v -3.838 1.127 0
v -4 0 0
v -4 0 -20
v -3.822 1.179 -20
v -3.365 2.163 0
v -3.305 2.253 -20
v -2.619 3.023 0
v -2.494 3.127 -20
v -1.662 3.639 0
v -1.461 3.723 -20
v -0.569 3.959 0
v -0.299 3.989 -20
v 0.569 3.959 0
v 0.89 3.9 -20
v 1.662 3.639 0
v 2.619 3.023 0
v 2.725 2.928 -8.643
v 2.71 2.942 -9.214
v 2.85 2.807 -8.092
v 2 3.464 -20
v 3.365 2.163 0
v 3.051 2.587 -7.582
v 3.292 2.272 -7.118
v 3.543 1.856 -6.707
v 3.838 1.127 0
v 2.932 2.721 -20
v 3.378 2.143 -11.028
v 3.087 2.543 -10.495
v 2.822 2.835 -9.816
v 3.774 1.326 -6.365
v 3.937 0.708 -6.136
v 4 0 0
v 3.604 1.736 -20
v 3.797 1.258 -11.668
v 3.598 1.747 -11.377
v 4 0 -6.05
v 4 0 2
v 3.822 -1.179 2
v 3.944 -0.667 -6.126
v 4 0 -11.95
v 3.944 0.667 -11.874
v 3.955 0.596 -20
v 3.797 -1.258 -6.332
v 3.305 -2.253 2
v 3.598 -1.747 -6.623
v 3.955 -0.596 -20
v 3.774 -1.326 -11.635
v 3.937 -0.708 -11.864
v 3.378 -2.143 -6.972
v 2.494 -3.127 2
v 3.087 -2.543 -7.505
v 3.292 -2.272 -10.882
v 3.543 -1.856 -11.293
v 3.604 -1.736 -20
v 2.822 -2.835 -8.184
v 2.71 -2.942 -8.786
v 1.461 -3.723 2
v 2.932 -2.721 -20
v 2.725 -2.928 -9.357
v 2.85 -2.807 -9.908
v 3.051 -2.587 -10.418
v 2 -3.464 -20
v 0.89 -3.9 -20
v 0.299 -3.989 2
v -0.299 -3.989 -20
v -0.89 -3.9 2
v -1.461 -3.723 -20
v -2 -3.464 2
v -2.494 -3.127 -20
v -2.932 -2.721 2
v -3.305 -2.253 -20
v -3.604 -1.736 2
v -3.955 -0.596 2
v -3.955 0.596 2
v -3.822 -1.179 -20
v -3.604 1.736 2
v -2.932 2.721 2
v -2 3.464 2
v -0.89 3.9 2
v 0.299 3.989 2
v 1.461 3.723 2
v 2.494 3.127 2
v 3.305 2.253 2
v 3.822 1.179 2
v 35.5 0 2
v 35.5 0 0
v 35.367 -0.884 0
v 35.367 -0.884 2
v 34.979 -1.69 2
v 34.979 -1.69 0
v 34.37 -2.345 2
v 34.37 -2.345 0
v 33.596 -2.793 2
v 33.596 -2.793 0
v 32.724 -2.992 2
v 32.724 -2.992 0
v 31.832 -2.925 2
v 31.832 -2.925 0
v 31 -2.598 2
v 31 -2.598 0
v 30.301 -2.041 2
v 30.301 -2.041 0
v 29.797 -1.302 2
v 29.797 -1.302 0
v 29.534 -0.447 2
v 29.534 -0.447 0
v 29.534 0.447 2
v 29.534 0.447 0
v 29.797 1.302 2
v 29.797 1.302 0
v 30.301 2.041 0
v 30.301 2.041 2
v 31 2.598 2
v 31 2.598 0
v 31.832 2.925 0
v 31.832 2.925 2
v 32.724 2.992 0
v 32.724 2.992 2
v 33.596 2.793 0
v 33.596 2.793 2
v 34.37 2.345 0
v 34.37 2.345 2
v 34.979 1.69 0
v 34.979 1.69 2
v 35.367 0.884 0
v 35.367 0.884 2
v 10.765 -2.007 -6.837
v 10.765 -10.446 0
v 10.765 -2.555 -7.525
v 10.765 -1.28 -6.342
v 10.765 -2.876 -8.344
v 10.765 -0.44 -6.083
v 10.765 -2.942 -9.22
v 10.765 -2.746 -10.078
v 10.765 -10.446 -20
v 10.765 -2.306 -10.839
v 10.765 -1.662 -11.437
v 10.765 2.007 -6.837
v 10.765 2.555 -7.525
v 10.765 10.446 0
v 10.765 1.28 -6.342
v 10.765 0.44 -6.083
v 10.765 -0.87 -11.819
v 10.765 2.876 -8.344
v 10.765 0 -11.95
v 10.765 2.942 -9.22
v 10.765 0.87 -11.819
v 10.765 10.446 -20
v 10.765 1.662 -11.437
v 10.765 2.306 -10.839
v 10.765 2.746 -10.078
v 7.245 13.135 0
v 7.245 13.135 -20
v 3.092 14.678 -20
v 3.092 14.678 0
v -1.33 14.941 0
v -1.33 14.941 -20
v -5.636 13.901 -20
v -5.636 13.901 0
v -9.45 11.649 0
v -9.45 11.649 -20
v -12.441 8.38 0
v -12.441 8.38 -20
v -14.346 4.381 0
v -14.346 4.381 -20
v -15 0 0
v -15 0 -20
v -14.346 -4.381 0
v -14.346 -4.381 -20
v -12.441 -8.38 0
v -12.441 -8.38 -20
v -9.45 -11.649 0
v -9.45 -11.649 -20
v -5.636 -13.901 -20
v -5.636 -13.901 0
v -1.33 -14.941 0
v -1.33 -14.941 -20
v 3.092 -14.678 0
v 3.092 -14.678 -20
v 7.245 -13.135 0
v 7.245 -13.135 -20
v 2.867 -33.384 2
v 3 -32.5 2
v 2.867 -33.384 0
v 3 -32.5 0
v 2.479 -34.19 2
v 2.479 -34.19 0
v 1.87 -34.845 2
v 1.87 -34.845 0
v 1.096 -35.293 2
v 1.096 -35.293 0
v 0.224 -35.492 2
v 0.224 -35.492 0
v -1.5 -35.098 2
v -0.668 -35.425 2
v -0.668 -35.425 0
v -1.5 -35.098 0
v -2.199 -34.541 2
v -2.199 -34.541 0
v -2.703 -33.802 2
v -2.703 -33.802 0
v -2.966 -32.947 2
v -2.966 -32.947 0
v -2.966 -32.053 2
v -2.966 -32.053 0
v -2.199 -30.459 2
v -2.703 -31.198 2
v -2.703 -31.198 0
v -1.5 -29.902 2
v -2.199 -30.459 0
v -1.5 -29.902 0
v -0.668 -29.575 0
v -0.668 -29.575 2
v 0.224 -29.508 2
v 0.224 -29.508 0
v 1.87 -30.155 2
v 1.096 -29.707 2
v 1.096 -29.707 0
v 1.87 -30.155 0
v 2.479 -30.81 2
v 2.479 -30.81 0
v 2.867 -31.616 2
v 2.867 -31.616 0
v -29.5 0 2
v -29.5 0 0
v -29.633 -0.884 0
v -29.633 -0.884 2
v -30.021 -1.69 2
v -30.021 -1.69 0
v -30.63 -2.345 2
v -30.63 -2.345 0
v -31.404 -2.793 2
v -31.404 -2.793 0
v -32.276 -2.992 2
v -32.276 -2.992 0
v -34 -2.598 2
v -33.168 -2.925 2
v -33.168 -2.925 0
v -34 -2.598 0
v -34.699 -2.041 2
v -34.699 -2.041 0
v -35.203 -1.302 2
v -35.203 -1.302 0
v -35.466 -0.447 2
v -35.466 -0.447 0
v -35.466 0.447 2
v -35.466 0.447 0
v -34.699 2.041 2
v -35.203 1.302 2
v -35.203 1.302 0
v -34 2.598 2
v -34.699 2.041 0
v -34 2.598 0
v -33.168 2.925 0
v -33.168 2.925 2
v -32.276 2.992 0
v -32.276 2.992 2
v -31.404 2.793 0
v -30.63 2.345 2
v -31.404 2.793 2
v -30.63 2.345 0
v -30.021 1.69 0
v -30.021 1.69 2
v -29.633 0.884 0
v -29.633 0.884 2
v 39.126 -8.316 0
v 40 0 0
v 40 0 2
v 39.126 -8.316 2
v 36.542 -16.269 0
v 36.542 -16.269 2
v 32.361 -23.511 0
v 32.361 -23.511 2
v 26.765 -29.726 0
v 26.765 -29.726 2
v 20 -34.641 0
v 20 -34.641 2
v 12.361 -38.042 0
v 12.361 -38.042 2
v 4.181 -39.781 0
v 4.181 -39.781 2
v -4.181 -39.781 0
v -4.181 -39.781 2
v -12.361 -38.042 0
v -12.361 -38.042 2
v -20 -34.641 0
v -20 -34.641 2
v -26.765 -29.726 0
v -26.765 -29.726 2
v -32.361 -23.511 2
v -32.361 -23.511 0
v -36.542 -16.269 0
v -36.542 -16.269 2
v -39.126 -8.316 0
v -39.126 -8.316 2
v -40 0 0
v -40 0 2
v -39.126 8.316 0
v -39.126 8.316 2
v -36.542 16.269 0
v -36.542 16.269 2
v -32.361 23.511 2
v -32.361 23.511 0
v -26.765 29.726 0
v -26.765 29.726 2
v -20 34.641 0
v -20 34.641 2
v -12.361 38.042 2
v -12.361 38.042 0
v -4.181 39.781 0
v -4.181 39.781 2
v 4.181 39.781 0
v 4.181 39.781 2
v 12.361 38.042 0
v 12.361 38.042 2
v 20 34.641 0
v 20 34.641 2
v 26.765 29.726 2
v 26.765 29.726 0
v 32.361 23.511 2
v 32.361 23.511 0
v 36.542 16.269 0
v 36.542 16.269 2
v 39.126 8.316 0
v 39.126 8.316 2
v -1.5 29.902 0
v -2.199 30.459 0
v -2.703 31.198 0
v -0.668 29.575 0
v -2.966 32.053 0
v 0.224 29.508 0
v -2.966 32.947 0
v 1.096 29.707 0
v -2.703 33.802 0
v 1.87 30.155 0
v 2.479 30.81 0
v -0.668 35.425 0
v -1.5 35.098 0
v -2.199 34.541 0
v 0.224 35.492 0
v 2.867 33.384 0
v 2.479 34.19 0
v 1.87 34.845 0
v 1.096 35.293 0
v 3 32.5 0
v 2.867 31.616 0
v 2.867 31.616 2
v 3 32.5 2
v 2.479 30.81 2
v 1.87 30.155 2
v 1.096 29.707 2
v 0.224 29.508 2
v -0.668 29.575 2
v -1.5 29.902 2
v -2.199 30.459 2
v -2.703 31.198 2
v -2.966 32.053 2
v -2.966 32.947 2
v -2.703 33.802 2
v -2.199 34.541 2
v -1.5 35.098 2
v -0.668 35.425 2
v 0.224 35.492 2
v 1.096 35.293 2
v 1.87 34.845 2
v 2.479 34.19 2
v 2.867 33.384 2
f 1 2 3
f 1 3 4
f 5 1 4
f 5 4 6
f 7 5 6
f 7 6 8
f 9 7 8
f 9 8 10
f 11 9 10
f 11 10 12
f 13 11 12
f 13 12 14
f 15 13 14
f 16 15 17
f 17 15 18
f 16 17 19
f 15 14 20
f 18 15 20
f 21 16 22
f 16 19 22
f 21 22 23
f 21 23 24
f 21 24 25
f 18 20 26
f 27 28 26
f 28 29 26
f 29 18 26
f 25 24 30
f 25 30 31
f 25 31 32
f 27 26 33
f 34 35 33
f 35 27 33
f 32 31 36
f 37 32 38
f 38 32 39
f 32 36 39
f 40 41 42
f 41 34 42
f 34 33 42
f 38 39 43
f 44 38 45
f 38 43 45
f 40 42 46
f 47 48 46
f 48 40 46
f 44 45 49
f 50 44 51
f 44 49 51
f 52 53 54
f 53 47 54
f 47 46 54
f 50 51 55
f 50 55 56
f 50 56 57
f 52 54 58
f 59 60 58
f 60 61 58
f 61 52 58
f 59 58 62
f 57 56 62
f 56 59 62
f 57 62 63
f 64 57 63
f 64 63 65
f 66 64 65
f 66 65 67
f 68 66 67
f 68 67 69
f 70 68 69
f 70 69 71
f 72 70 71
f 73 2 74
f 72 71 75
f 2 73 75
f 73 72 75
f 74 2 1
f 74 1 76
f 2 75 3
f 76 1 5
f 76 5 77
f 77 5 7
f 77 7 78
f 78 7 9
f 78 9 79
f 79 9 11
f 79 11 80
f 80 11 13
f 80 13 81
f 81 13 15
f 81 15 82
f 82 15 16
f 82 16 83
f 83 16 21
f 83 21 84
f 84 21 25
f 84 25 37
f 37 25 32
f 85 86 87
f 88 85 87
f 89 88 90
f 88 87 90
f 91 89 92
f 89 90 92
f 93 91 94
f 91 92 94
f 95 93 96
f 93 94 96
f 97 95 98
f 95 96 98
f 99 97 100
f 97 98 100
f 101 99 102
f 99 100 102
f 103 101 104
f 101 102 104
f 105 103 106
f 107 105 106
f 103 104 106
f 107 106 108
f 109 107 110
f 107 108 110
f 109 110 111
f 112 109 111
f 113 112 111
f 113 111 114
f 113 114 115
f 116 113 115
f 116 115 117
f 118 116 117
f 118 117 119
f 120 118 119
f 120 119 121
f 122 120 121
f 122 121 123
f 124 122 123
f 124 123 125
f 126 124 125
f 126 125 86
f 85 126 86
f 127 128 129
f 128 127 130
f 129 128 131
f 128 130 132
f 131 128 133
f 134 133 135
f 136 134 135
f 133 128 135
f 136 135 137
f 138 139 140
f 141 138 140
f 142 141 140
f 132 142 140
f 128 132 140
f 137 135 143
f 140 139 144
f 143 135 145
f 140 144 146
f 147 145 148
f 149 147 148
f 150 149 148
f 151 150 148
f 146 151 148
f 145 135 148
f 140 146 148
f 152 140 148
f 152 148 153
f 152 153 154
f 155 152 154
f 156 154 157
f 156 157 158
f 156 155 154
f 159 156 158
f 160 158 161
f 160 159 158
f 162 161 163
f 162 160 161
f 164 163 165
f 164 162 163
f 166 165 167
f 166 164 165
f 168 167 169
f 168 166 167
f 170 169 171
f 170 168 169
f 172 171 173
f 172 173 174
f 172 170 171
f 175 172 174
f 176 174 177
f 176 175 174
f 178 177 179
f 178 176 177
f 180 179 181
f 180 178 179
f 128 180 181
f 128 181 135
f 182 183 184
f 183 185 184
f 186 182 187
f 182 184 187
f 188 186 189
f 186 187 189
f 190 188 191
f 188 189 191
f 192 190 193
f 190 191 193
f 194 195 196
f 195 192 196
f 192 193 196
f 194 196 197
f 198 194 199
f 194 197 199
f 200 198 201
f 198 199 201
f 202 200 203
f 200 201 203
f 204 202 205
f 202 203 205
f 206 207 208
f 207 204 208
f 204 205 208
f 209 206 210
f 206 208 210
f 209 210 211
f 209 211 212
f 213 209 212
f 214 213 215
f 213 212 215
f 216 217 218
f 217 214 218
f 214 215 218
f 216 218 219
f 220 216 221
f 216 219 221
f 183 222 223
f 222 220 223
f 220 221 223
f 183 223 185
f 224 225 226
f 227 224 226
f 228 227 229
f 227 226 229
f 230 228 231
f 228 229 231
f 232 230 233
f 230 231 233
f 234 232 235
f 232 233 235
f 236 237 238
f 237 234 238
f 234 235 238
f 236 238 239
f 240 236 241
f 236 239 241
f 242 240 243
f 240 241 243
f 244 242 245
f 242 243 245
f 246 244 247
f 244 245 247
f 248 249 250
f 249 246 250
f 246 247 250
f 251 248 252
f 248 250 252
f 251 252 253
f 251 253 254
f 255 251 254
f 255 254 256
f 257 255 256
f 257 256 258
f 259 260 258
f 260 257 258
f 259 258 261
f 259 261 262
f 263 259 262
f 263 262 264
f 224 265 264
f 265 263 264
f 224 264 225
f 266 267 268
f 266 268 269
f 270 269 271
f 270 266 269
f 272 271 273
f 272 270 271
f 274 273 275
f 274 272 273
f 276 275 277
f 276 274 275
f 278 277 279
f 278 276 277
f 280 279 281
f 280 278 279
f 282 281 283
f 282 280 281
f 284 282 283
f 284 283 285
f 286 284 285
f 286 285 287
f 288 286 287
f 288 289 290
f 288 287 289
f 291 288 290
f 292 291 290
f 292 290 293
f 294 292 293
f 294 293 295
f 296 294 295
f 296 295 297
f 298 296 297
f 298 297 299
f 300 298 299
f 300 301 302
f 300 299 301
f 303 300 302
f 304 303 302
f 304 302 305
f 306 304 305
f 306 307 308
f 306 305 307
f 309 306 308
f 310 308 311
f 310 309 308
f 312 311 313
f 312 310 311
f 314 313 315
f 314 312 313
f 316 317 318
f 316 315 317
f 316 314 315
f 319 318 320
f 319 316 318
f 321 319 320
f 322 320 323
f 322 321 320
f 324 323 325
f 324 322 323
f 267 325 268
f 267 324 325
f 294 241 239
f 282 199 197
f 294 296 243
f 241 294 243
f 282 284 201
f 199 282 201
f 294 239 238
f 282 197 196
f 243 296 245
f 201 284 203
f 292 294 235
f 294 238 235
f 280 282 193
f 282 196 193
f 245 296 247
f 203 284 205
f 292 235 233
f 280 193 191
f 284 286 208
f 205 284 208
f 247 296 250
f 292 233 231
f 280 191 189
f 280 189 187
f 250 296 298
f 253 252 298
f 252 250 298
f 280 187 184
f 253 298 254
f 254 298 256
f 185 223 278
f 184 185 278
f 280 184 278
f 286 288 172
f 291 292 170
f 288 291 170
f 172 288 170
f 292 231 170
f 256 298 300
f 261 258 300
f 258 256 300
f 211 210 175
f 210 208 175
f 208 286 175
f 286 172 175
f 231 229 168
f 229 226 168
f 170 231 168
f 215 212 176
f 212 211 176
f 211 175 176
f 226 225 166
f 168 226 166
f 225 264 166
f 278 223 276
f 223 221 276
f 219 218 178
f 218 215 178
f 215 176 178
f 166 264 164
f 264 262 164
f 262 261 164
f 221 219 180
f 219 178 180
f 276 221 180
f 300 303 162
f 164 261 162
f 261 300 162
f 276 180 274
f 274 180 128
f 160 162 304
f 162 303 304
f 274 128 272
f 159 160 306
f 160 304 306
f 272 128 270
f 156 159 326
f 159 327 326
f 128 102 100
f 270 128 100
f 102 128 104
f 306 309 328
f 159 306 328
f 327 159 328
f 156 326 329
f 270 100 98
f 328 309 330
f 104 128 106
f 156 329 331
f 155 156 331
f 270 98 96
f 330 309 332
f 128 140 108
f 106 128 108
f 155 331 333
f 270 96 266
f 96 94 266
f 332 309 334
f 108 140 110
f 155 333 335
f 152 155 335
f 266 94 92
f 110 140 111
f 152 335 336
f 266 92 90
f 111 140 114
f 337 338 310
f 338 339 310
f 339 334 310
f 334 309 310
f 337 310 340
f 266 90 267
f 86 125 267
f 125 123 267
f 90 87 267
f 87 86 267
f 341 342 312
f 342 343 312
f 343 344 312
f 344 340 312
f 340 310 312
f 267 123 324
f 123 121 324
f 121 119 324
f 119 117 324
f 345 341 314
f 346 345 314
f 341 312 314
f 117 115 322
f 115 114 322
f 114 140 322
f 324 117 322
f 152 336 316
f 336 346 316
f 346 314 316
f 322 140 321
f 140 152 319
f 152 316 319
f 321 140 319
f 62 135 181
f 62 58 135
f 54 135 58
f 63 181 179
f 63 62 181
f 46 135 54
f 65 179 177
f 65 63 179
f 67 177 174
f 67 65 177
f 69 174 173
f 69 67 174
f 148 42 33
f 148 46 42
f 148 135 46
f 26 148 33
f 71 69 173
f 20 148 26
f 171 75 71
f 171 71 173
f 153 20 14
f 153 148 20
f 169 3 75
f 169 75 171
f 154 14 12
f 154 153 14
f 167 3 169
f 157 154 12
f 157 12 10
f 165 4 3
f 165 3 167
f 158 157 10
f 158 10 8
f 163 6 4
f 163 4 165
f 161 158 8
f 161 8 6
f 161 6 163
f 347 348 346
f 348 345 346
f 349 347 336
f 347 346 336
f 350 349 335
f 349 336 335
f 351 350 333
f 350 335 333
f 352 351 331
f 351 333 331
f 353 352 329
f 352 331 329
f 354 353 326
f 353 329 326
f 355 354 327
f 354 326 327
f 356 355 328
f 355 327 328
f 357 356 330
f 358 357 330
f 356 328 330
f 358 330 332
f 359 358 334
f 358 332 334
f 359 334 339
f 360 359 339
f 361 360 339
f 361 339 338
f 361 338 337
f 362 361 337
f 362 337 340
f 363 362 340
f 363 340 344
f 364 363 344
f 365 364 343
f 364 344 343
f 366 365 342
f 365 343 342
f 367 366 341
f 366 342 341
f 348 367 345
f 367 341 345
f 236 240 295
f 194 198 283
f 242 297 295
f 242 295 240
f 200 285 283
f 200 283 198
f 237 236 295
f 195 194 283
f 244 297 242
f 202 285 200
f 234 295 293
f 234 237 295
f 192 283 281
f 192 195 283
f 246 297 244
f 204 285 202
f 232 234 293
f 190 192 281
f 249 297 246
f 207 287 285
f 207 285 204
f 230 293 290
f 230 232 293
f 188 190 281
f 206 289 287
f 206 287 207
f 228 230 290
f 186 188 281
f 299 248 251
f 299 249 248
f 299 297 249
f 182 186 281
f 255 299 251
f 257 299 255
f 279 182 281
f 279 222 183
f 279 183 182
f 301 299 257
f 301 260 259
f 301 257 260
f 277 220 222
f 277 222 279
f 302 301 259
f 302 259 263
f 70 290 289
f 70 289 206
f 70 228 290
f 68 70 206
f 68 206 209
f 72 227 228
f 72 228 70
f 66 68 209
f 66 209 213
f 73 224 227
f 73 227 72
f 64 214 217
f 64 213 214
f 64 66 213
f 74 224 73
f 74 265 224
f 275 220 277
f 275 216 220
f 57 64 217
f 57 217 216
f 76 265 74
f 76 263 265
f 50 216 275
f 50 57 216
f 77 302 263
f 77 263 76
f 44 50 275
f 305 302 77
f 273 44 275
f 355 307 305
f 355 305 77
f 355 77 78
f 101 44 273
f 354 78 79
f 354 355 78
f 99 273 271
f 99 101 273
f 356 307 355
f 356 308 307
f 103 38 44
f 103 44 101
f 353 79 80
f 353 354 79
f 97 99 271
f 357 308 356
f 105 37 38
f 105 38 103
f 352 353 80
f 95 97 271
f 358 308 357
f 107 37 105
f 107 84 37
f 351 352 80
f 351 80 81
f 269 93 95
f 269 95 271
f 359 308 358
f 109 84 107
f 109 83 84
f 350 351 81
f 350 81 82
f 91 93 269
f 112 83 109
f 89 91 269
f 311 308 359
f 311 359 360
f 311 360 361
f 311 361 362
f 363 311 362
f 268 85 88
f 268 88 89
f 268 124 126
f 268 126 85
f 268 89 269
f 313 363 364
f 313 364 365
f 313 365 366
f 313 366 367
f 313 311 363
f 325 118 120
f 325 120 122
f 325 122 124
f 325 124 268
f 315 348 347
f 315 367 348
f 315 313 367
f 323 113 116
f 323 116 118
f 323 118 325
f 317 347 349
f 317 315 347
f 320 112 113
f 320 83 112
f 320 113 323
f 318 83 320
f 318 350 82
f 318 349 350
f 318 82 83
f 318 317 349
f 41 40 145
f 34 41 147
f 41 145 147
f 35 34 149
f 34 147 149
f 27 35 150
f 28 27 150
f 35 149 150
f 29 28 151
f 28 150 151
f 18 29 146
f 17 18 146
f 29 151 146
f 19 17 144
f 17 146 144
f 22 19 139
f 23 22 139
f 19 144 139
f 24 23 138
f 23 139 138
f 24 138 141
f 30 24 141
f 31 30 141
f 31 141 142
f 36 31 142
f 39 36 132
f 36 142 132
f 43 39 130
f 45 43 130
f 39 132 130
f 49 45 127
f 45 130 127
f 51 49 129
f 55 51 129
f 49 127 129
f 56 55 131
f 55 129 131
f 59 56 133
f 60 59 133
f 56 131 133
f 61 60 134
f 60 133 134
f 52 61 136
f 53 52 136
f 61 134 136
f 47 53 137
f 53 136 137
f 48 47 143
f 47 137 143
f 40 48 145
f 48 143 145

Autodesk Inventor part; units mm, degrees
ref_plane "YZ Plane" through (0, 0, 0) normal (1, 0, 0) x (0, 1, 0)
ref_plane "XZ Plane" through (0, 0, 0) normal (0, 1, 0) x (-1, 0, 0)
ref_plane "XY Plane" through (0, 0, 0) normal (0, 0, 1) x (1, 0, 0)
sketch "Sketch1" plane through (0, 0, 0) normal (0, 0, 1) x (1, 0, 0)
  circle A0 centre (0, 0) radius 40
  line L0 (0, 0) -> (32.5, 0)
  line L1 (0, 0) -> (0, 32.5)
  circle A1 centre (0, 32.5) radius 3
  circle A2 centre (32.5, 0) radius 3
  circle A3 centre (0, -32.5) radius 3
  circle A4 centre (-32.5, 0) radius 3
  circle A5 centre (0, 0) radius 4
  dimension "d0" = 80
  dimension "d1" = 32.5
  dimension "d2" = 32.5
  dimension "d3" = 6
  dimension "d4" = 6
  dimension "d5" = 8
extrude "Extrusion1" add sketch "Sketch1" along normal blind 2
sketch "Sketch2" plane through (0, 0, 0) normal (0, 0, -1) x (-1, 0, 0)
  circle A0 centre (0, 0) radius 4 projected
  circle A1 centre (0, 0) radius 15
  dimension "d8" = 30
extrude "Extrusion2" add sketch "Sketch2" along normal blind 20
sketch "Sketch3" plane through (0, 0, -20) normal (0, 0, -1) x (-1, 0, 0)
  circle A0 centre (0, 0) radius 15 projected
  line L0 (-10.7651, -10.4457) -> (-10.7651, 10.4457)
  circle A1 centre (0, 0) radius 15
extrude "Extrusion3" cut sketch "Sketch3" against normal blind 20 contours L0 A0 picked at (-11.4387, 2.6145)
sketch "Sketch4" plane through (10.7651, -10.4457, -20) normal (1, 0, 0) x (0, 0, -1)
  circle A0 centre (-11, 10.4457) radius 2.95
  point P0 (-20, 10.4457)
  dimension "d13" = 5.9
extrude "Extrusion4" cut sketch "Sketch4" against normal blind 11.75
thread "Thread1" size "M6x1" class "6H" standard "ISO Metric profile" length 19.85
properties part number "Sprocket Adapter"
